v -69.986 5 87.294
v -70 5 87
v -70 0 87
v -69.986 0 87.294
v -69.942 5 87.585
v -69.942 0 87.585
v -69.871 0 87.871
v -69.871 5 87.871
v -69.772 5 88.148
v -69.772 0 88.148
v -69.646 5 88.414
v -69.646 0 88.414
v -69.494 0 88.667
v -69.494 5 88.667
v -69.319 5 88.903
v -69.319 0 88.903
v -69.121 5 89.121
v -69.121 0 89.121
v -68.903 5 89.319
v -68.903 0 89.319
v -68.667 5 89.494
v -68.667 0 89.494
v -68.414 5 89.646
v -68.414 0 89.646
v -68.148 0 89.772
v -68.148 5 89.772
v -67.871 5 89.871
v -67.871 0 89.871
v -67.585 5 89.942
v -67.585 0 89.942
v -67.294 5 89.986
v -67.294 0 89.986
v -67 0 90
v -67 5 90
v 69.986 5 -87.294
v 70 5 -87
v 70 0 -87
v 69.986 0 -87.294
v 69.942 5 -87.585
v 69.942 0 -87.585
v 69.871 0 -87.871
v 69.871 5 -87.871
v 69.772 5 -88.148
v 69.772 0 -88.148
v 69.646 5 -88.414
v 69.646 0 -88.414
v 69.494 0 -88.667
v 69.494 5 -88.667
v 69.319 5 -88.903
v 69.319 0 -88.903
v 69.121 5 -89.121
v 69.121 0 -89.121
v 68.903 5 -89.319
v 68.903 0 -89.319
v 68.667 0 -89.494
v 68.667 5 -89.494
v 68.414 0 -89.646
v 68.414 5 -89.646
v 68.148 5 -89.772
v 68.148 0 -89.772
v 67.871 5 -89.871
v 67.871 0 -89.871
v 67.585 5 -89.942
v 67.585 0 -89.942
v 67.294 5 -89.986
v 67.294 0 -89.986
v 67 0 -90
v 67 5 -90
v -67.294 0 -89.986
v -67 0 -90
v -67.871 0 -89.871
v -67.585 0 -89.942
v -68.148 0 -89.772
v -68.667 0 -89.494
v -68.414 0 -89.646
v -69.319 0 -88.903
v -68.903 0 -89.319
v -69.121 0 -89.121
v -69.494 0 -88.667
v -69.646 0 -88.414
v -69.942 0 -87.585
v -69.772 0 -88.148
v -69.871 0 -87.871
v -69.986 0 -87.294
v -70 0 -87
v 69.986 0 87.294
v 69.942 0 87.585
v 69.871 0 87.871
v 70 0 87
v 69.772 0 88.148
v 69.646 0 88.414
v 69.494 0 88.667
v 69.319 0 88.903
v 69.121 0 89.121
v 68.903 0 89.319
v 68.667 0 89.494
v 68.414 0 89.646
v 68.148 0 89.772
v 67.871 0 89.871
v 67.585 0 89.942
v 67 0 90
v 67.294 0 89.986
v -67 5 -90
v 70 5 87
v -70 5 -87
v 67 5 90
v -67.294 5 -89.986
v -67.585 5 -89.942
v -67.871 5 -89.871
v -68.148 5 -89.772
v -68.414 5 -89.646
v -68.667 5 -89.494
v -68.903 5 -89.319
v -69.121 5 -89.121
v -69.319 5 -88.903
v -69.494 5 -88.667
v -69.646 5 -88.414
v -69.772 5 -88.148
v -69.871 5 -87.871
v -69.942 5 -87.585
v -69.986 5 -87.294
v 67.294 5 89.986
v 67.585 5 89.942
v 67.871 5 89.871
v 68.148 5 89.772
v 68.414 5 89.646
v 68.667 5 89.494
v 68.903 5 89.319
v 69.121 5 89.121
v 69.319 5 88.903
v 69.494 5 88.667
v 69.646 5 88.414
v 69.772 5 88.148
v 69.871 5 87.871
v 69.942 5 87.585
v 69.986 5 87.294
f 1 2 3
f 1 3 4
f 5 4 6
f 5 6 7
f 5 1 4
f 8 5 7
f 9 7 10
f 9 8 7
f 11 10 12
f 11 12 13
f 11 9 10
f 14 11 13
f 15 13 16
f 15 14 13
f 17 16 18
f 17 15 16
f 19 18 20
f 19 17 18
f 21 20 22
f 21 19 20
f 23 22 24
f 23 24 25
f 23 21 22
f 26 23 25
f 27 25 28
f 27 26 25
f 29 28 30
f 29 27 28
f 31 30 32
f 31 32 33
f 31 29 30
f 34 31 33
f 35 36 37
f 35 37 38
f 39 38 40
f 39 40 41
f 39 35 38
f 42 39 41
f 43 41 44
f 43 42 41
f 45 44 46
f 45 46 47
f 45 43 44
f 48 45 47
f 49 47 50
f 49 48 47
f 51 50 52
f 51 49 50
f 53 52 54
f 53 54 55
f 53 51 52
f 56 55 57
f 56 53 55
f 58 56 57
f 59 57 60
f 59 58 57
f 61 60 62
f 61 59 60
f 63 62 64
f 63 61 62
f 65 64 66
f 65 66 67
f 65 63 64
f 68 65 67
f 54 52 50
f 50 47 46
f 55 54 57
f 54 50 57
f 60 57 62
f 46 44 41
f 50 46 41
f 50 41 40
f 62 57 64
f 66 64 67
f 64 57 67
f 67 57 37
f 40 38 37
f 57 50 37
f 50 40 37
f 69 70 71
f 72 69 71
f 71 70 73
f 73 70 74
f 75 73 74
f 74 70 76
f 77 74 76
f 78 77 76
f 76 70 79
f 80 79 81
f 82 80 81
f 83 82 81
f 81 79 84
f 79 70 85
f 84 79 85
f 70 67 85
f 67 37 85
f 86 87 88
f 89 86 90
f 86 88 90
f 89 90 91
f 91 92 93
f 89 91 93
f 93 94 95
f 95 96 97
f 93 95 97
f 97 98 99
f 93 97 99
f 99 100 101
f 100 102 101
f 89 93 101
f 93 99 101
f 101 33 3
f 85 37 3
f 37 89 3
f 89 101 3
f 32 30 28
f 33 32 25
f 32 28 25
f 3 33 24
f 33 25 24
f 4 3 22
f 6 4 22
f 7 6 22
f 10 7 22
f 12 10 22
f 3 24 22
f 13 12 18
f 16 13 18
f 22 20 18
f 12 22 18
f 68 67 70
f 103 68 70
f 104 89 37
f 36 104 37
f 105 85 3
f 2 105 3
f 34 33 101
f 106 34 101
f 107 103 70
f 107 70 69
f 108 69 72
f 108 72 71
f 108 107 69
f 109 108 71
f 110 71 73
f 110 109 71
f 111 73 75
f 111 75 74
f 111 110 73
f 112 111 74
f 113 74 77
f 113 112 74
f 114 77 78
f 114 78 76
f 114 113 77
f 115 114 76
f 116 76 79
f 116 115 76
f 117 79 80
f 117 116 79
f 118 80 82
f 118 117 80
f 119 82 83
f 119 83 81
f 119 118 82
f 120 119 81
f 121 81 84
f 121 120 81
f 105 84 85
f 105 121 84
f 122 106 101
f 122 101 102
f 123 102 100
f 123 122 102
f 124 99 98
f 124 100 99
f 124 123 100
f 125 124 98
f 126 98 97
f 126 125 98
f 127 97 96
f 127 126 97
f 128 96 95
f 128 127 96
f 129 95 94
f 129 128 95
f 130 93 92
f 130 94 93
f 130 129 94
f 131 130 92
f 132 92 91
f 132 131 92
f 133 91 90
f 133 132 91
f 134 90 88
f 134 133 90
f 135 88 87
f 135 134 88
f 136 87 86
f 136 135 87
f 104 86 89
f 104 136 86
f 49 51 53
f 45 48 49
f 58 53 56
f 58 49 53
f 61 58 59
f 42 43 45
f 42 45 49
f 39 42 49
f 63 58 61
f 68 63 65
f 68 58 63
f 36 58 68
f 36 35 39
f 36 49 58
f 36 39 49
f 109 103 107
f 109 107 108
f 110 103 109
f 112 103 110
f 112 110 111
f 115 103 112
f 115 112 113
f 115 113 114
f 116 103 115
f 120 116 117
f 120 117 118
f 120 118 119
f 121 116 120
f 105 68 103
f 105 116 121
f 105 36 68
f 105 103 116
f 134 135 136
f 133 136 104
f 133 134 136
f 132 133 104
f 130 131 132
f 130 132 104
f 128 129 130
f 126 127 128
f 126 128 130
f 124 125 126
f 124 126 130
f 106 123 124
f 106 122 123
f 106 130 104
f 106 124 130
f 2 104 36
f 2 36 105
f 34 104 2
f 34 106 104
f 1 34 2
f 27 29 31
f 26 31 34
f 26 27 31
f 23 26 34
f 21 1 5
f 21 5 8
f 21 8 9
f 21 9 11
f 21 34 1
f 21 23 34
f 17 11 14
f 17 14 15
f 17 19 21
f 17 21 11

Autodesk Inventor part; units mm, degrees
ref_plane "YZ Plane" through (0, 0, 0) normal (1, 0, 0) x (0, 1, 0)
ref_plane "XZ Plane" through (0, 0, 0) normal (0, 1, 0) x (-1, 0, 0)
ref_plane "XY Plane" through (0, 0, 0) normal (0, 0, 1) x (1, 0, 0)
sketch "Sketch1" plane through (0, 0, 0) normal (0, 1, 0) x (-1, 0, 0)
  line L0 (70, 90) -> (-70, 90)
  line L1 (-70, 90) -> (-70, -90)
  line L2 (-70, -90) -> (70, -90)
  line L3 (70, -90) -> (70, 90)
  line L4 (70, 90) -> (-70, -90) construction
  line L5 (-70, 90) -> (70, -90) construction
  point P0 (0, 0)
  dimension "d0" = 140
  dimension "d1" = 180
extrude "Extrusion1" add sketch "Sketch1" along normal blind 5
fillet "Face Fillet1" radius 3 1 edges at (70, 2.5, 90)
fillet "Face Fillet2" radius 3 1 edges at (70, 2.5, -90)
fillet "Face Fillet3" radius 3 1 edges at (-70, 2.5, -90)
fillet "Face Fillet4" radius 3 1 edges at (-70, 2.5, 90)
properties part number "ur3_base"
